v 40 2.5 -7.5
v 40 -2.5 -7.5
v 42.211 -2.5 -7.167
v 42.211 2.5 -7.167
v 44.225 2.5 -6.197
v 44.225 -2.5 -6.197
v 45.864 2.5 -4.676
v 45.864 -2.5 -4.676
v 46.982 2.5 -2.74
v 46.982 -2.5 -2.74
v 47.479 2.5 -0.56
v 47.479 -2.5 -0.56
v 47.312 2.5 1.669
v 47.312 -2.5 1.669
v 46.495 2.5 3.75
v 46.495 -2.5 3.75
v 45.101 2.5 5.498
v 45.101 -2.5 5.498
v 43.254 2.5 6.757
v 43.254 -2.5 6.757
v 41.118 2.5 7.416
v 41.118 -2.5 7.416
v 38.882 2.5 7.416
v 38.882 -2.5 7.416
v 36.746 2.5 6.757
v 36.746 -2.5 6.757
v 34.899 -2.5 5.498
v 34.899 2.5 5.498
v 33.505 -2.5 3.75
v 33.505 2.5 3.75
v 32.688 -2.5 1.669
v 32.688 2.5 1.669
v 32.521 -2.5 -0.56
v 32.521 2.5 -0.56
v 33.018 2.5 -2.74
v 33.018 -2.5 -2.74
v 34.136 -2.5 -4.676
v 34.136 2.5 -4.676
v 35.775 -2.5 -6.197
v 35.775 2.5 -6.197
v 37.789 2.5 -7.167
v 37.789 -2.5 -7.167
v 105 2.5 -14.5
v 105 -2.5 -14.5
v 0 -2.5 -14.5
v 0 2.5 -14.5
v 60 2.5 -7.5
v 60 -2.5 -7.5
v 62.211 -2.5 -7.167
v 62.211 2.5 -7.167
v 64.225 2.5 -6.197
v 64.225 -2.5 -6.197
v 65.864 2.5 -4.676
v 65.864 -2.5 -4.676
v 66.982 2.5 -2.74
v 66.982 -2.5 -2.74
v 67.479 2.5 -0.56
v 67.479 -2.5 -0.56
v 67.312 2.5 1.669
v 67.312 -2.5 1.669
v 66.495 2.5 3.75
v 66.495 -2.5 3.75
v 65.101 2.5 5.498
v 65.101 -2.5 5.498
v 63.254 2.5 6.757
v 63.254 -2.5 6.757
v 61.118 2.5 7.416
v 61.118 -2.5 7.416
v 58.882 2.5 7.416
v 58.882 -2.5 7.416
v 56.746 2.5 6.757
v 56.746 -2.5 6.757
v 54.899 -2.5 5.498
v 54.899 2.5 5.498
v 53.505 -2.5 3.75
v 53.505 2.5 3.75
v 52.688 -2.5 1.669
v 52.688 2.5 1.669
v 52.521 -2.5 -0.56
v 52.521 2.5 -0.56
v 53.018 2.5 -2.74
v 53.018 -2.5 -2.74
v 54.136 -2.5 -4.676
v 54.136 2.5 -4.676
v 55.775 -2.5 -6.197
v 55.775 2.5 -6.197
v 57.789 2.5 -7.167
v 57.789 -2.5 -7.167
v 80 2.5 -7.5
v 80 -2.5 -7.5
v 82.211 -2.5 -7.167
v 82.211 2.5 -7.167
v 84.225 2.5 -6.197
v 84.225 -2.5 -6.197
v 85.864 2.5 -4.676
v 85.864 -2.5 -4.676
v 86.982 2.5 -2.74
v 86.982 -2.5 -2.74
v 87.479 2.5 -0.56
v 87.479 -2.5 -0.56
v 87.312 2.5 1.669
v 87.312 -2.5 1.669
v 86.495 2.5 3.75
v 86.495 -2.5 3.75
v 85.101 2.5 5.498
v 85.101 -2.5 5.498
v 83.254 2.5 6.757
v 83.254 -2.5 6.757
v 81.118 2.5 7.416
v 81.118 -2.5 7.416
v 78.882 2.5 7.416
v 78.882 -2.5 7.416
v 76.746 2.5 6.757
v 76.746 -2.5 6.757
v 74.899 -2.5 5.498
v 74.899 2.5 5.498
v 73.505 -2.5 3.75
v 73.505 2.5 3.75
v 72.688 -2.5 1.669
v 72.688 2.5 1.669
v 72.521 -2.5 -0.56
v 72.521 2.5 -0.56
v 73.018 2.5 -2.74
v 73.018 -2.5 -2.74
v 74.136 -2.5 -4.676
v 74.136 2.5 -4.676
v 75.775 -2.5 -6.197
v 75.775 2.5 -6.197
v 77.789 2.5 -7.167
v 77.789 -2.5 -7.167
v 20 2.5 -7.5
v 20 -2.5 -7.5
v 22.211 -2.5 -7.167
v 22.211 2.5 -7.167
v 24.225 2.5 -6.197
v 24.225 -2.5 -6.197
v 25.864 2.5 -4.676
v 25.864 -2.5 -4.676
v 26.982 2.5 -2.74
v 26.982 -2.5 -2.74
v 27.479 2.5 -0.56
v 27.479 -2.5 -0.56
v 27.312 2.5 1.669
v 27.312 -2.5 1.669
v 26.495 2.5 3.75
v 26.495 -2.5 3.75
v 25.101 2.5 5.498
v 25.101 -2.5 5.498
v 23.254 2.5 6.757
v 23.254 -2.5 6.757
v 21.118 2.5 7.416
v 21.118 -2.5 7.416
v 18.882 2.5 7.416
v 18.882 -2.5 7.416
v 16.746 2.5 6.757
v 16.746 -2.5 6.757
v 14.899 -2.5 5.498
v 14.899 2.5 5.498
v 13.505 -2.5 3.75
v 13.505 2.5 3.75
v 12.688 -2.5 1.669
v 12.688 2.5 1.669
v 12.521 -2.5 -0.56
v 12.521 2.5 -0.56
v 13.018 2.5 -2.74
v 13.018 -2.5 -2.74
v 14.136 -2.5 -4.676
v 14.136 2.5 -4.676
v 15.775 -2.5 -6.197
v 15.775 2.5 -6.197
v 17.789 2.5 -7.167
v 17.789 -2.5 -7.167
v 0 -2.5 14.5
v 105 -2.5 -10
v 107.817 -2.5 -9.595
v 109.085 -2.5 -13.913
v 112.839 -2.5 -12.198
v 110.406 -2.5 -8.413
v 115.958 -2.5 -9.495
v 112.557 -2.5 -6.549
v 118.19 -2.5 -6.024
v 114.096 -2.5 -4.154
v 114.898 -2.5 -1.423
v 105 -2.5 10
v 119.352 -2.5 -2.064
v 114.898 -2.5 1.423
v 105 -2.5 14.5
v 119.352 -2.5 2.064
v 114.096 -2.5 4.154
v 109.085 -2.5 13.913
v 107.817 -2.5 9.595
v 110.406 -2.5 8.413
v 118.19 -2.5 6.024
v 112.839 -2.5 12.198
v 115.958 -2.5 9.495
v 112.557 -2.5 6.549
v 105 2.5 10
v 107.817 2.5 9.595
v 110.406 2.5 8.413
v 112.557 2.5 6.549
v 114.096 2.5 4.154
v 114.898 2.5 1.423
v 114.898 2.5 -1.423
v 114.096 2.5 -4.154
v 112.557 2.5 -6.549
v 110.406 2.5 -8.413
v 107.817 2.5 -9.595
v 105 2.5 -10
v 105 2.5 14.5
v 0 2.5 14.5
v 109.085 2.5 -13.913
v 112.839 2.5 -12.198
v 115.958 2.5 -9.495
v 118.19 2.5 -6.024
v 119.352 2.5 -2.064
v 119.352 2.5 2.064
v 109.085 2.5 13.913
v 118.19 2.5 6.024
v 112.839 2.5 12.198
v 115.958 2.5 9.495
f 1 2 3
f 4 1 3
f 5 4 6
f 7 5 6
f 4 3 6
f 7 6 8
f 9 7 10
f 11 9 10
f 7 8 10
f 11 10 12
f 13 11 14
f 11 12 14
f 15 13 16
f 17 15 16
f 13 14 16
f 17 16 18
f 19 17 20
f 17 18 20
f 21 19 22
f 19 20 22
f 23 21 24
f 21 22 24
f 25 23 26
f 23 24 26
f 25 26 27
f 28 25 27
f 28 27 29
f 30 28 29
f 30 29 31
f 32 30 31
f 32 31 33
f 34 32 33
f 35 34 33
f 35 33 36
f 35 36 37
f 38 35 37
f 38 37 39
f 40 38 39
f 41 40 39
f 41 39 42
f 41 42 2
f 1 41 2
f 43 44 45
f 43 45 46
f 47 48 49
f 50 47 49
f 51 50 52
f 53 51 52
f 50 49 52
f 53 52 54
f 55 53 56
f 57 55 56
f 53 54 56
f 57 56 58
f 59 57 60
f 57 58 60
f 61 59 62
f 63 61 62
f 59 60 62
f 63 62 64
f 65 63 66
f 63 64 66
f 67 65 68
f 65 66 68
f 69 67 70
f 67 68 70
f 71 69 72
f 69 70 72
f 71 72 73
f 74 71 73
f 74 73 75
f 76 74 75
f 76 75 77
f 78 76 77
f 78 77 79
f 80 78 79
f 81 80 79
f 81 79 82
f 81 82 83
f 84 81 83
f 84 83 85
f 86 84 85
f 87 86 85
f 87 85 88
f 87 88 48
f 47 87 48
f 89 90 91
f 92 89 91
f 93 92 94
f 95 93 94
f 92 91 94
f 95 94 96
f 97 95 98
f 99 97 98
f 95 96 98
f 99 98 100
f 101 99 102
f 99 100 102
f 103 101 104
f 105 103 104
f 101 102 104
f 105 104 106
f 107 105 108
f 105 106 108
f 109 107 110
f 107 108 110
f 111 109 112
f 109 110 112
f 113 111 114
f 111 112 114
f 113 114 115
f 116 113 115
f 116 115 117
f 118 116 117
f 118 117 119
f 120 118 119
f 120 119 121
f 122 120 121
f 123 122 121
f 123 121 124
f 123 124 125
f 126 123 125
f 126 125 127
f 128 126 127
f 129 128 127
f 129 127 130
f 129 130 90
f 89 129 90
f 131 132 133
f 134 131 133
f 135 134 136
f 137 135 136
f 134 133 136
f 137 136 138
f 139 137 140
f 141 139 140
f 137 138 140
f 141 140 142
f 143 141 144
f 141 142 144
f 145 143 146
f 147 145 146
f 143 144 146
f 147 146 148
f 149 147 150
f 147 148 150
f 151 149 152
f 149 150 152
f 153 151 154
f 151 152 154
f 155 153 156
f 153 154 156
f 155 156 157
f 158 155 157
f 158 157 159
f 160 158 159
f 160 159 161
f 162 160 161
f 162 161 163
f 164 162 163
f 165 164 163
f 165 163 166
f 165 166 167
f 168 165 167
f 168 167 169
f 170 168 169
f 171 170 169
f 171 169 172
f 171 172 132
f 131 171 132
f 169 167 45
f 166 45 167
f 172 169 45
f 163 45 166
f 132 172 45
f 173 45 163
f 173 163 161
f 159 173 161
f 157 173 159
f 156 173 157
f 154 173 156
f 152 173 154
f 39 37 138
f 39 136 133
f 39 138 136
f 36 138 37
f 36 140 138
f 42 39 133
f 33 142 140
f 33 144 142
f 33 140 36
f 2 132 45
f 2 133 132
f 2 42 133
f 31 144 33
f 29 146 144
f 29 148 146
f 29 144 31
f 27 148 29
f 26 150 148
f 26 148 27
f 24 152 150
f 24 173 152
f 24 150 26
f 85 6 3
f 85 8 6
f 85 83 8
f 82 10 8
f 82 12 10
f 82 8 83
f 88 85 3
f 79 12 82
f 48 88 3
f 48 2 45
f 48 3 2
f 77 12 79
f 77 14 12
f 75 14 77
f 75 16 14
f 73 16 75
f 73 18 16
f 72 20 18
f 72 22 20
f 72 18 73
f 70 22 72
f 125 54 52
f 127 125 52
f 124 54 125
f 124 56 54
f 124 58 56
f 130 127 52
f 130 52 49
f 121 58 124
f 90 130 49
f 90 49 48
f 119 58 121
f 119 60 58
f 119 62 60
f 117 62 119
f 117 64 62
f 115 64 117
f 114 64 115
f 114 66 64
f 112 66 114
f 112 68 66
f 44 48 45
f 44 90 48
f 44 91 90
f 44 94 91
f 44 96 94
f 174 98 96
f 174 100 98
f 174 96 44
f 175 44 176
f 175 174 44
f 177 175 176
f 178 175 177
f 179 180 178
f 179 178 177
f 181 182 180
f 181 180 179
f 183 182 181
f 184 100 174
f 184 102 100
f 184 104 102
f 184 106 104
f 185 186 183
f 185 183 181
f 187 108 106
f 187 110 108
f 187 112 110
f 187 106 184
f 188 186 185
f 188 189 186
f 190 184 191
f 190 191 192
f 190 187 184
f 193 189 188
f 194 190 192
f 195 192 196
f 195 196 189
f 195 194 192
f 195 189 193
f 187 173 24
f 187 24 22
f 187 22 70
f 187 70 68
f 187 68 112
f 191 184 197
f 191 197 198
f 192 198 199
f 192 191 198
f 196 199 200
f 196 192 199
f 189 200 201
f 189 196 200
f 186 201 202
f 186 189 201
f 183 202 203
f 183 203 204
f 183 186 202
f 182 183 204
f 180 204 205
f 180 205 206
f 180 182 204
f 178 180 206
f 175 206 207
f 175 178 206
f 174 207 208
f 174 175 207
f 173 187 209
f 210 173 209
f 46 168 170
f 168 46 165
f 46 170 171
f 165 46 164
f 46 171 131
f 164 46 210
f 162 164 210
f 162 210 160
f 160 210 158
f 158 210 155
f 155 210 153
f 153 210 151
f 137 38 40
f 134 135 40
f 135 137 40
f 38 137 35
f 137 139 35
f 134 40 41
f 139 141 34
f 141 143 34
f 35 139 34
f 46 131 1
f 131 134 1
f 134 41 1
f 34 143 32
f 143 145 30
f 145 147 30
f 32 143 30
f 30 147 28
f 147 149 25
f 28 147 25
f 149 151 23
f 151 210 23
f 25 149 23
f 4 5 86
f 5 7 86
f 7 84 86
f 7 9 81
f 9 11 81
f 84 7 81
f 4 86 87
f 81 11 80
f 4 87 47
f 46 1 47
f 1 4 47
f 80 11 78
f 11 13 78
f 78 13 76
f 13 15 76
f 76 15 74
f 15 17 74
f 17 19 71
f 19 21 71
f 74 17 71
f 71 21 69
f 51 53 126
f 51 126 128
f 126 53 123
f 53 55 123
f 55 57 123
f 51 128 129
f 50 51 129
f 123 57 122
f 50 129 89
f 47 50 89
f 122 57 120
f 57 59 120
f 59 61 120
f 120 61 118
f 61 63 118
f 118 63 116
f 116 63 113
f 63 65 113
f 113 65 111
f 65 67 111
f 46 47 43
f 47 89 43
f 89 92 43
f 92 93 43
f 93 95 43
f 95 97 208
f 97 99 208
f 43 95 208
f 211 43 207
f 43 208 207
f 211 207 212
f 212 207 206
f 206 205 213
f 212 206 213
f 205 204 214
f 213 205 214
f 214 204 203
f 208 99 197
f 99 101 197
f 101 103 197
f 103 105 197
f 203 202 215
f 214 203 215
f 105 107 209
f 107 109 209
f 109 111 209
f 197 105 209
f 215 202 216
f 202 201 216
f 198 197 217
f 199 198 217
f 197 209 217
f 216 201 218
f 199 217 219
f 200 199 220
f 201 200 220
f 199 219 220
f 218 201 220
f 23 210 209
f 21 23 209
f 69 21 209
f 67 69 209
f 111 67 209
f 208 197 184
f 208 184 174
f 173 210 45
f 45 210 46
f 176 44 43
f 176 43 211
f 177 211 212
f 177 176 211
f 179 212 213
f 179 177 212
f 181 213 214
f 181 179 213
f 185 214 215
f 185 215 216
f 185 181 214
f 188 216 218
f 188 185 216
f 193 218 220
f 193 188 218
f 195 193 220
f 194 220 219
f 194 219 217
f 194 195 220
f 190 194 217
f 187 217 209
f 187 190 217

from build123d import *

# Parameters (mm, degrees)
SKETCH1_W           = 29
SKETCH1_H           = 5
BOSS_EXTRUDE1_DEPTH = 105
SKETCH2_R           = 7.5
CUT_EXTRUDE1_DEPTH  = 105
BOSS_EXTRUDE2_DEPTH = 5


with BuildPart() as part:
    # Sketch1 → Boss-Extrude1 (new body)
    with BuildSketch(Plane(origin=(0, 0, 0), x_dir=(0, 0, -1), z_dir=(1, 0, 0))):
        Rectangle(SKETCH1_W, SKETCH1_H)
    extrude(amount=BOSS_EXTRUDE1_DEPTH)

    # Sketch2 → Cut-Extrude1 (cut)
    with BuildSketch(Plane.XZ.offset(2.5)):
        with Locations(Location((20, 0, 0), (0, 0, 270))):
            Circle(SKETCH2_R)
        with Locations(Location((40, 0, 0), (0, 0, 270))):
            Circle(SKETCH2_R)
        with Locations(Location((60, 0, 0), (0, 0, 270))):
            Circle(SKETCH2_R)
        with Locations(Location((80, 0, 0), (0, 0, 270))):
            Circle(SKETCH2_R)
    extrude(amount=-CUT_EXTRUDE1_DEPTH, mode=Mode.SUBTRACT)

    # Sketch3 → Boss-Extrude2 (add)
    with BuildSketch(Plane.XZ.offset(2.5)):
        with BuildLine():
            Line((105, 14.5), (105, 10))
            ThreePointArc((105, 10), (115, 0), (105, -10))
            Line((105, -10), (105, -14.5))
            ThreePointArc((105, -14.5), (119.5, 0), (105, 14.5))
        make_face()
    extrude(amount=-BOSS_EXTRUDE2_DEPTH)


solid = part.part
